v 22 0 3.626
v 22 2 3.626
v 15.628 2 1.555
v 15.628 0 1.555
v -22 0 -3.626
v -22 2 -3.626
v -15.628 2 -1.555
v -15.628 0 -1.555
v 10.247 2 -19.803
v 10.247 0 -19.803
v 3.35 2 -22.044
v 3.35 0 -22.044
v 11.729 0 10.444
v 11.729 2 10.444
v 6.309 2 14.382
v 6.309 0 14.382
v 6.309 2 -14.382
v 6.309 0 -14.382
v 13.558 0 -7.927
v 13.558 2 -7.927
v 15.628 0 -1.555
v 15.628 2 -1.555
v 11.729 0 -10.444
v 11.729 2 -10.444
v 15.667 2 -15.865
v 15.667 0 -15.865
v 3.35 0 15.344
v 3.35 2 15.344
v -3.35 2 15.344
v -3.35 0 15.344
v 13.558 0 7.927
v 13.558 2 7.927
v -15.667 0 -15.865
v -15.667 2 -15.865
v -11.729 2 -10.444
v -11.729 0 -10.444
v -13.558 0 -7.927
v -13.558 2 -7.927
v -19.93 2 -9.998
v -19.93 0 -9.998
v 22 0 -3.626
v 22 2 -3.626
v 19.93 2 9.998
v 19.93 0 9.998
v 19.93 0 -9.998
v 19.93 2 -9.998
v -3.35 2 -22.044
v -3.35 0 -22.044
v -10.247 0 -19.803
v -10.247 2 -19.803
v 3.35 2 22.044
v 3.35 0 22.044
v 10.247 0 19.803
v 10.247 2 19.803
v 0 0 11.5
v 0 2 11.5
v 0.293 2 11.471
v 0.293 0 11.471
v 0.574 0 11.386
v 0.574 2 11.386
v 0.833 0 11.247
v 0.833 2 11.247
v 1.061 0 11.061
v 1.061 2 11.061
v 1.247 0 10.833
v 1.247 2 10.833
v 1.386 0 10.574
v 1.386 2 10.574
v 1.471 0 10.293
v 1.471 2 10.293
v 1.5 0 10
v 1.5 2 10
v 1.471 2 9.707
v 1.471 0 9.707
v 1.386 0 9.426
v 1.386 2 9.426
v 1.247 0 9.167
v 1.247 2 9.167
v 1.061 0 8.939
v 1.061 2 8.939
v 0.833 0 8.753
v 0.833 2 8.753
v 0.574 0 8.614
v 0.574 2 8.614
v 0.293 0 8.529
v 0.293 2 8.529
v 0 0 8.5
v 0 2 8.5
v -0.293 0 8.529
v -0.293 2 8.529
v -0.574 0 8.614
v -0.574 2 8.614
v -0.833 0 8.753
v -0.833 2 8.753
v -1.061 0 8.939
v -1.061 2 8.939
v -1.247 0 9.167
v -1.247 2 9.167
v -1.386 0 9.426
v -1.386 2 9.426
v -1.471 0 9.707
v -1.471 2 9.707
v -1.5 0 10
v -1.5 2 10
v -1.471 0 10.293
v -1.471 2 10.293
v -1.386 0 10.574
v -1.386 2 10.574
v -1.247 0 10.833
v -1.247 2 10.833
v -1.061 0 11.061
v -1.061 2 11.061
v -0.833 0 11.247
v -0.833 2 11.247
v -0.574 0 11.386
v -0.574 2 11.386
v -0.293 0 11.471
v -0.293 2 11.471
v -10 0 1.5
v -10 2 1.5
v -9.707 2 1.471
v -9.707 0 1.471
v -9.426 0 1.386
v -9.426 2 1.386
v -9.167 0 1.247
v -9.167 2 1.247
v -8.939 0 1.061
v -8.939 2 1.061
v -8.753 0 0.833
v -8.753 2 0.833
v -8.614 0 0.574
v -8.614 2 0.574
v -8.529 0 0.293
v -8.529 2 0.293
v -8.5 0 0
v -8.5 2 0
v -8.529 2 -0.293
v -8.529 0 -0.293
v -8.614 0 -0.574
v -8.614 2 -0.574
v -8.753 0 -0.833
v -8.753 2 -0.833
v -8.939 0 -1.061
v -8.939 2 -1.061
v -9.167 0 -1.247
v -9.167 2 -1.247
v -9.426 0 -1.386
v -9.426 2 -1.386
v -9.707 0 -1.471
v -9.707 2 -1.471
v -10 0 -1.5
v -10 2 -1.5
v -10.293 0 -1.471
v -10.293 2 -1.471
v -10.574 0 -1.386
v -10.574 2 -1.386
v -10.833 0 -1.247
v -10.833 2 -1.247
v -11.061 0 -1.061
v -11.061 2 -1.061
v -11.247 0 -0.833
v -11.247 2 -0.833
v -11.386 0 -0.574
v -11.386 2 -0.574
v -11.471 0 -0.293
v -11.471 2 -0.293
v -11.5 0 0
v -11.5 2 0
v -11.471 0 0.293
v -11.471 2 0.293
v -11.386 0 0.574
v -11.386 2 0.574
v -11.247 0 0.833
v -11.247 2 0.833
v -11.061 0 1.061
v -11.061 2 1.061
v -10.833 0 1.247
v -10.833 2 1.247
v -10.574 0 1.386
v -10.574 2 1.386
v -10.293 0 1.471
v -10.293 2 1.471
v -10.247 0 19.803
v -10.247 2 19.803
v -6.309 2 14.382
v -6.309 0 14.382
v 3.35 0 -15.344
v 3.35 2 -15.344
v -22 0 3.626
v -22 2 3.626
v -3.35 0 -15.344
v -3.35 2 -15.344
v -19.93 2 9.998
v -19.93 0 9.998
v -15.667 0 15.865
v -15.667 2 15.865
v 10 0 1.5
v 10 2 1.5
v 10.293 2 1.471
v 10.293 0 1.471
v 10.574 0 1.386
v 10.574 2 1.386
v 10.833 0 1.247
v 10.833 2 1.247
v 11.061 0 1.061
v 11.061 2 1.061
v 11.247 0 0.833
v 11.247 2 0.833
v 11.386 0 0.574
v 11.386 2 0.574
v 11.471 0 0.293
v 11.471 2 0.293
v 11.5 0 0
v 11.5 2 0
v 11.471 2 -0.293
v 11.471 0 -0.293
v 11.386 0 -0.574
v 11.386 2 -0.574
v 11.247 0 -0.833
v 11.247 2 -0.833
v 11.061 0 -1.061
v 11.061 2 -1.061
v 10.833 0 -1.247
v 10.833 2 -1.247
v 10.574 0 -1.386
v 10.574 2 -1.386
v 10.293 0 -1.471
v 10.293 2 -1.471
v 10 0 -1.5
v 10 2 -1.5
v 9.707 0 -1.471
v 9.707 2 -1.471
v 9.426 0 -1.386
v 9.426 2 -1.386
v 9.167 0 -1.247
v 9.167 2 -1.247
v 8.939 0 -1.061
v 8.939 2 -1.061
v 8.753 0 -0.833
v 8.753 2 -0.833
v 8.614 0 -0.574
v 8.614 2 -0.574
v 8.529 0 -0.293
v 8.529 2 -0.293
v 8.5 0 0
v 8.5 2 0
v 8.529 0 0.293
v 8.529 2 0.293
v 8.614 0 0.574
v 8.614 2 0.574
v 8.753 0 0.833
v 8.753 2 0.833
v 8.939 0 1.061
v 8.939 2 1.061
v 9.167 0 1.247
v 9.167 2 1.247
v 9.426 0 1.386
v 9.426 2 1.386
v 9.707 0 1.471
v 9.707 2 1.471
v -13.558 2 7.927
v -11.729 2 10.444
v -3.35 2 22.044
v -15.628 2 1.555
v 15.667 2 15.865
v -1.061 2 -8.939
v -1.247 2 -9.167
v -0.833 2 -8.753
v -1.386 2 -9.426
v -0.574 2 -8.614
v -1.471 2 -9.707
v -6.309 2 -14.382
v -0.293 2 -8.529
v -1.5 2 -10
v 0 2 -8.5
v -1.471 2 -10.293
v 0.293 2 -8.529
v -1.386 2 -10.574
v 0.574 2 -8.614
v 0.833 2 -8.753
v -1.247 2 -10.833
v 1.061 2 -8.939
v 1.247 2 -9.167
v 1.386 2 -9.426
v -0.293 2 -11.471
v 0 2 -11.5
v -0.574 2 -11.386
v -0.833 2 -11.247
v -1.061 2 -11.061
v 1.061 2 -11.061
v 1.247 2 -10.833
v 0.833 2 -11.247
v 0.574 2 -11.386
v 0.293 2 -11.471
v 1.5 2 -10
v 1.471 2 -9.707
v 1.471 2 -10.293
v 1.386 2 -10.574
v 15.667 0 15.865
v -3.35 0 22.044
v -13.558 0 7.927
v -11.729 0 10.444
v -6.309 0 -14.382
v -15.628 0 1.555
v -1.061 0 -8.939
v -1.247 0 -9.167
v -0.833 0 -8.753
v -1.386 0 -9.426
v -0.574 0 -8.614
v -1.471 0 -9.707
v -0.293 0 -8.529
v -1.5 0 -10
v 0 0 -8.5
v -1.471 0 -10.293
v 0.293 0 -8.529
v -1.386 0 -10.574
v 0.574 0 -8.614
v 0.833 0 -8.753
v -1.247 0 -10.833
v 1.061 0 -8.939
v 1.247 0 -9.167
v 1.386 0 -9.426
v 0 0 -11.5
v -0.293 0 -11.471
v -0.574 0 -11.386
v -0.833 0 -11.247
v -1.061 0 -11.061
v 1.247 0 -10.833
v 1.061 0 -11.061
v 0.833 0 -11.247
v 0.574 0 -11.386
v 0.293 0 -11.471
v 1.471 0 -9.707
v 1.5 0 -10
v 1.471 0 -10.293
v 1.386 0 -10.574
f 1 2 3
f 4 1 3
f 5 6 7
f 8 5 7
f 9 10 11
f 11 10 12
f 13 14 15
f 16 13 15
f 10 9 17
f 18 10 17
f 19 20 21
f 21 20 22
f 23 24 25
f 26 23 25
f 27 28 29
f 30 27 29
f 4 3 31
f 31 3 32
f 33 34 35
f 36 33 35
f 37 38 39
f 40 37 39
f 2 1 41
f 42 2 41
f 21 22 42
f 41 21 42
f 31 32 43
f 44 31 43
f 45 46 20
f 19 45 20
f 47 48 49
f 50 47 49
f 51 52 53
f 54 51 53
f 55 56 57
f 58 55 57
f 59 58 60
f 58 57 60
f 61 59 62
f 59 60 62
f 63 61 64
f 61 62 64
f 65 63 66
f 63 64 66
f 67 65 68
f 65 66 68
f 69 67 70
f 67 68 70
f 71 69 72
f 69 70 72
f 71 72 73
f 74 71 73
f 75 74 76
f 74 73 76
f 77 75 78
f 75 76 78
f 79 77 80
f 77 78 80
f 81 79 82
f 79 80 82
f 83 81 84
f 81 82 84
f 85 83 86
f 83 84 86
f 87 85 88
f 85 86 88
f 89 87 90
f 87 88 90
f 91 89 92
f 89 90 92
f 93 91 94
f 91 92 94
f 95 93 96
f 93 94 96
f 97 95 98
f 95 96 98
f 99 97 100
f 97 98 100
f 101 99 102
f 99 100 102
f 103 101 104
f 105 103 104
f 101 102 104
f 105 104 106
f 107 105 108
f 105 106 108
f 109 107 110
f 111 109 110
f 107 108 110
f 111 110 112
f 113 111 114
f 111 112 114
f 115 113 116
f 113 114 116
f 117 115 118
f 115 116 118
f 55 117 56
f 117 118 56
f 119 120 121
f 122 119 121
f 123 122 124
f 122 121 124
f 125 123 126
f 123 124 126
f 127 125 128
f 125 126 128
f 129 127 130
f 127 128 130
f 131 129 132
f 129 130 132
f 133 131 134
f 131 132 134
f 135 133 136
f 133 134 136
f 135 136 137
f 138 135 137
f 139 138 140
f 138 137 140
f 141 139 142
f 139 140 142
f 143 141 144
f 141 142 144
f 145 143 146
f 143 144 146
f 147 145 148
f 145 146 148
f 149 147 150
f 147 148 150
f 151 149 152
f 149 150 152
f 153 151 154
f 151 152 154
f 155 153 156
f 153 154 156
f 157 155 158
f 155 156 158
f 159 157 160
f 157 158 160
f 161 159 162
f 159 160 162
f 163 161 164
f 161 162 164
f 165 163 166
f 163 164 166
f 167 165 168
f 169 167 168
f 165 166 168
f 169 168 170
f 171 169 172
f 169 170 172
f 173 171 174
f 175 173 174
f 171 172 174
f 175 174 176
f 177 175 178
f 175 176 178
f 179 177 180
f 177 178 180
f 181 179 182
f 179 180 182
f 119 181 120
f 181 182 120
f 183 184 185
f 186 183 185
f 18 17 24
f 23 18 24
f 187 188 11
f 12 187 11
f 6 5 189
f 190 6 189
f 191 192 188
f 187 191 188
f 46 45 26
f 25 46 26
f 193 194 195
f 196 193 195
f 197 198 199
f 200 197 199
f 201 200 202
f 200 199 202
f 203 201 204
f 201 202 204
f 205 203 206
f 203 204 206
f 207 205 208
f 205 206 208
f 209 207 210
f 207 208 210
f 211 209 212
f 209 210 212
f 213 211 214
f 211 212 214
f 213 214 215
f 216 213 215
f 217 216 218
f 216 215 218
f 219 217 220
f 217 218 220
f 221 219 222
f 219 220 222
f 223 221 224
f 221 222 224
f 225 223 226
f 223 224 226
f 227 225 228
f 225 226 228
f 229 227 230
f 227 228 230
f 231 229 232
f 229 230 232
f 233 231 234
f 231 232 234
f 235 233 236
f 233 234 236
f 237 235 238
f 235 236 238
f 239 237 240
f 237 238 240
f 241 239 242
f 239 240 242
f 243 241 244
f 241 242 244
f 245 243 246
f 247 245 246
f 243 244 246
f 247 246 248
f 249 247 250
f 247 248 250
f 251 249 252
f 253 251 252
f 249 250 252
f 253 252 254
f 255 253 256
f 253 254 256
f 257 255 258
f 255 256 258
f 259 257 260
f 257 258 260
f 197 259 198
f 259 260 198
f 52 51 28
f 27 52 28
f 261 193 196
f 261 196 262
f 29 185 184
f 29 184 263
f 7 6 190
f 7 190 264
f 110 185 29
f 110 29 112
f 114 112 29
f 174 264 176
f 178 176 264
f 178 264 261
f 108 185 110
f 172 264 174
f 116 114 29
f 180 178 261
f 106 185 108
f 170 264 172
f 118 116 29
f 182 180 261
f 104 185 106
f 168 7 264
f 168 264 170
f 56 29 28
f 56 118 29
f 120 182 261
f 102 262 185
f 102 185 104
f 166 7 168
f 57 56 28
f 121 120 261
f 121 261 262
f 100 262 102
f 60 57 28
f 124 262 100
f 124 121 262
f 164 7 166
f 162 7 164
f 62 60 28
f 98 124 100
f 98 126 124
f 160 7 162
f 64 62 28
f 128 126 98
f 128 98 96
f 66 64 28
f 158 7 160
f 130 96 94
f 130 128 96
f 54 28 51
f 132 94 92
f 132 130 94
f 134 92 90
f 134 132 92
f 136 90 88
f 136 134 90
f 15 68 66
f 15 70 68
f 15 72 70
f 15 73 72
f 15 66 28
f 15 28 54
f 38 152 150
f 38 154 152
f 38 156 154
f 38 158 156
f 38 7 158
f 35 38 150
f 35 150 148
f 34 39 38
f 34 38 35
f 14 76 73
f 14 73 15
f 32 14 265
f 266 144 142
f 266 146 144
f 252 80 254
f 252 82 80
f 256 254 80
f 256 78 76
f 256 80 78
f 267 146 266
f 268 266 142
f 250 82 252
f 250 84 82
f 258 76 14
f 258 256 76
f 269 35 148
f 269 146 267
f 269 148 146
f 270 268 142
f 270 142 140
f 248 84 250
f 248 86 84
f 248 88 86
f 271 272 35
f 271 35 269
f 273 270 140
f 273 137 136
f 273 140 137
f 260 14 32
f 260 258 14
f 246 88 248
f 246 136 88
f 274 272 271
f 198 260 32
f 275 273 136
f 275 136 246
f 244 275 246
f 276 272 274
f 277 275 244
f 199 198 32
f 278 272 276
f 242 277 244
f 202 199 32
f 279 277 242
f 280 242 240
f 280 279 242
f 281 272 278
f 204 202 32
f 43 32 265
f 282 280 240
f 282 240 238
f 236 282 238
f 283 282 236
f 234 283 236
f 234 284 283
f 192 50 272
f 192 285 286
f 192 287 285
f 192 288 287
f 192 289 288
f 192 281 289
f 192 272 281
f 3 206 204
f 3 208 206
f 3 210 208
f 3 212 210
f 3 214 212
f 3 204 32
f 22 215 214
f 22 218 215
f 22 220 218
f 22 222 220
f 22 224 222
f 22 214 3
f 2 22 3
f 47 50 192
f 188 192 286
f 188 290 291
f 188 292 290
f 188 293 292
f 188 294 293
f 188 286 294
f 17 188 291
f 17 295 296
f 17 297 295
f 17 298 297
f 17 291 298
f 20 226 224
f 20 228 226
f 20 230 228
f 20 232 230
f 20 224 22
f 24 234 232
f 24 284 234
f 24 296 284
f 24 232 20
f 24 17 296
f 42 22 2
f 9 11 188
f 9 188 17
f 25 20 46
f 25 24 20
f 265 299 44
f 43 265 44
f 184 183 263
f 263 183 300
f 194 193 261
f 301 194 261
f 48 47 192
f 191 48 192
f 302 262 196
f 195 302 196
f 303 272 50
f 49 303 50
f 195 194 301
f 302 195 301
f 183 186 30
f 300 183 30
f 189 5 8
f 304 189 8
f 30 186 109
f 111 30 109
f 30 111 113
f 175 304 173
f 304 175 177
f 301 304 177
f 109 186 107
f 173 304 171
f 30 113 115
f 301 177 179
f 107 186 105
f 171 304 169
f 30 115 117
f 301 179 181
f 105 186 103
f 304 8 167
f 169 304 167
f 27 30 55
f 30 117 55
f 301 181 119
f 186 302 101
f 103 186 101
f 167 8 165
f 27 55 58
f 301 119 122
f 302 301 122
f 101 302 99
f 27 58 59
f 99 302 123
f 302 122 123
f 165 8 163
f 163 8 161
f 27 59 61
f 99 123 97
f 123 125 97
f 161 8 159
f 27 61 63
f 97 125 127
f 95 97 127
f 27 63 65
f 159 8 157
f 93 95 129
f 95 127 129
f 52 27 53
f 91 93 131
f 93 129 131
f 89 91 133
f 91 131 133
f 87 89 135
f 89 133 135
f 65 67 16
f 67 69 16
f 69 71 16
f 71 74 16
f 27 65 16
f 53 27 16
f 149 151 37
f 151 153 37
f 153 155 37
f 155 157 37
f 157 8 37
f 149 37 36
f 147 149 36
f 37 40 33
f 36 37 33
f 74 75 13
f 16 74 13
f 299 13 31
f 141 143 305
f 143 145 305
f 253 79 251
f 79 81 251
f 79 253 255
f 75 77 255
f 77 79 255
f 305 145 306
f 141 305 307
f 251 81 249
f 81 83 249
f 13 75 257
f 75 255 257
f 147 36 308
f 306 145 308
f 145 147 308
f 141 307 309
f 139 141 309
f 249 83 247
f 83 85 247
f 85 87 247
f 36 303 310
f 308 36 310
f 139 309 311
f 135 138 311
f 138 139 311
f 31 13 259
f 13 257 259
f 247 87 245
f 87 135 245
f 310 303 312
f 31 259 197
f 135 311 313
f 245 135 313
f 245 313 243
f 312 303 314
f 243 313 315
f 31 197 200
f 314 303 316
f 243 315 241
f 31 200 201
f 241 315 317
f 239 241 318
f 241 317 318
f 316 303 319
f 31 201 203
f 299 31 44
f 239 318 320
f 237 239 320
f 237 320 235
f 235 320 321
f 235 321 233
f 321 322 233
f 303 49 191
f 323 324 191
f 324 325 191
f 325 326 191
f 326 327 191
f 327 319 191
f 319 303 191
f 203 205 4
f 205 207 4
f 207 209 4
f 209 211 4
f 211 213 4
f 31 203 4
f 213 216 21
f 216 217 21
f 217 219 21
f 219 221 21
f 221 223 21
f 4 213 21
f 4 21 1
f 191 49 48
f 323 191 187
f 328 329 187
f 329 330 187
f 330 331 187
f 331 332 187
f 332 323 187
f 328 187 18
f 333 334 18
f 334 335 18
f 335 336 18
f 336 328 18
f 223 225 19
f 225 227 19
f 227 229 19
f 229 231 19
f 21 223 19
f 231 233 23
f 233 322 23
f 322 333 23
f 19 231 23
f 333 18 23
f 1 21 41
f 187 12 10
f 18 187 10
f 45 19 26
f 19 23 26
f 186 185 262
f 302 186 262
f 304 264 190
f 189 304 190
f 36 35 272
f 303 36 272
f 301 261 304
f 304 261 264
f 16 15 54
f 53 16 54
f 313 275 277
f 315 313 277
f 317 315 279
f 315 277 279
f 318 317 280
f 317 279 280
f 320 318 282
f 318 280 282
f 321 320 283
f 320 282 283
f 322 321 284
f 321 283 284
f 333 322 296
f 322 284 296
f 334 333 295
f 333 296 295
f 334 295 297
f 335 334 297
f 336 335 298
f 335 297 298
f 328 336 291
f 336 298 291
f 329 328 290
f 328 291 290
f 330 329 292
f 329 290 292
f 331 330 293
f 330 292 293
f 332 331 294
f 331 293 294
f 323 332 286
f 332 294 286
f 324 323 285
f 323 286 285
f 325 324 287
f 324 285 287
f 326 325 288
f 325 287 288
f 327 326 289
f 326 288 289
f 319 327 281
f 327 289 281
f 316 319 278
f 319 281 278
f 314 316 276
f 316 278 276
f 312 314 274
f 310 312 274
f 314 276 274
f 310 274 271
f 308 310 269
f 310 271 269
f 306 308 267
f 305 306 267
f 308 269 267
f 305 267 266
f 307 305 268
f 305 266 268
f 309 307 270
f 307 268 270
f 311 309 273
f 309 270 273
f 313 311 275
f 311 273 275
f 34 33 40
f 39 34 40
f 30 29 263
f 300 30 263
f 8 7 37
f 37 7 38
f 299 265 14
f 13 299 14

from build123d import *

# Parameters (mm, degrees)
BOSS_EXTRUDE1_DEPTH = 2
CUT_EXTRUDE1_DEPTH  = 2
SKETCH7_R           = 1.5
CUT_EXTRUDE3_DEPTH  = 2


with BuildPart() as part:
    # Sketch1 → Boss-Extrude1 (new body)
    with BuildSketch(Plane(origin=(0, 0, 0), x_dir=(1, 0, 0), z_dir=(0, 1, 0))):
        Polygon((0, 23.132168933), (-13.596747752, 18.714317784), (-22, 7.148233317), (-22, -7.148233317), (-13.596747752, -18.714317784), (0, -23.132168933), (13.596747752, -18.714317784), (22, -7.148233317), (22, 7.148233317), (13.596747752, 18.714317784), align=None)
    extrude(amount=BOSS_EXTRUDE1_DEPTH)

    # Sketch2 → Cut-Extrude1 (cut)
    with BuildSketch(Plane(origin=(0, 2, 0), x_dir=(1, 0, 0), z_dir=(0, 1, 0))):
        Polygon((0, 23.132168933), (-3.35, 22.043687951), (-3.35, 15.343687951), (3.35, 15.343687951), (3.35, 22.043687951), align=None)
        Polygon((11.729000424, 10.444223713), (15.667161615, 15.864637576), (13.596747752, 18.714317784), (10.246747752, 19.802798766), (6.308586562, 14.382384904), align=None)
        Polygon((15.627921341, 1.555421004), (22, 3.625834866), (22, 7.148233317), (19.929586138, 9.997913525), (13.557507479, 7.927499663), align=None)
        Polygon((13.557507479, -7.927499663), (19.929586138, -9.997913525), (22, -7.148233317), (22, -3.625834866), (15.627921341, -1.555421004), align=None)
        Polygon((6.308586562, -14.382384904), (10.246747752, -19.802798766), (13.596747752, -18.714317784), (15.667161615, -15.864637576), (11.729000424, -10.444223713), align=None)
        Polygon((-3.35, -15.343687951), (-3.35, -22.043687951), (0, -23.132168933), (3.35, -22.043687951), (3.35, -15.343687951), align=None)
        Polygon((-11.729000424, -10.444223713), (-15.667161615, -15.864637576), (-13.596747752, -18.714317784), (-10.246747752, -19.802798766), (-6.308586562, -14.382384904), align=None)
        Polygon((-15.627921341, -1.555421004), (-22, -3.625834866), (-22, -7.148233317), (-19.929586138, -9.997913525), (-13.557507479, -7.927499663), align=None)
        Polygon((-13.557507479, 7.927499663), (-19.929586138, 9.997913525), (-22, 7.148233317), (-22, 3.625834866), (-15.627921341, 1.555421004), align=None)
        Polygon((-6.308586562, 14.382384904), (-10.246747752, 19.802798766), (-13.596747752, 18.714317784), (-15.667161615, 15.864637576), (-11.729000424, 10.444223713), align=None)
    extrude(amount=-CUT_EXTRUDE1_DEPTH, mode=Mode.SUBTRACT)

    # Sketch7 → Cut-Extrude3 (cut)
    with BuildSketch(Plane(origin=(0, 2, 0), x_dir=(1, 0, 0), z_dir=(0, 1, 0))):
        with Locations(Location((0, 10, 0), (0, 0, 270))):
            Circle(SKETCH7_R)
        with Locations(Location((10, 0, 0), (0, 0, 270))):
            Circle(SKETCH7_R)
        with Locations(Location((0, -10, 0), (0, 0, 270))):
            Circle(SKETCH7_R)
        with Locations(Location((-10, 0, 0), (0, 0, 270))):
            Circle(SKETCH7_R)
    extrude(amount=-CUT_EXTRUDE3_DEPTH, mode=Mode.SUBTRACT)


solid = part.part
